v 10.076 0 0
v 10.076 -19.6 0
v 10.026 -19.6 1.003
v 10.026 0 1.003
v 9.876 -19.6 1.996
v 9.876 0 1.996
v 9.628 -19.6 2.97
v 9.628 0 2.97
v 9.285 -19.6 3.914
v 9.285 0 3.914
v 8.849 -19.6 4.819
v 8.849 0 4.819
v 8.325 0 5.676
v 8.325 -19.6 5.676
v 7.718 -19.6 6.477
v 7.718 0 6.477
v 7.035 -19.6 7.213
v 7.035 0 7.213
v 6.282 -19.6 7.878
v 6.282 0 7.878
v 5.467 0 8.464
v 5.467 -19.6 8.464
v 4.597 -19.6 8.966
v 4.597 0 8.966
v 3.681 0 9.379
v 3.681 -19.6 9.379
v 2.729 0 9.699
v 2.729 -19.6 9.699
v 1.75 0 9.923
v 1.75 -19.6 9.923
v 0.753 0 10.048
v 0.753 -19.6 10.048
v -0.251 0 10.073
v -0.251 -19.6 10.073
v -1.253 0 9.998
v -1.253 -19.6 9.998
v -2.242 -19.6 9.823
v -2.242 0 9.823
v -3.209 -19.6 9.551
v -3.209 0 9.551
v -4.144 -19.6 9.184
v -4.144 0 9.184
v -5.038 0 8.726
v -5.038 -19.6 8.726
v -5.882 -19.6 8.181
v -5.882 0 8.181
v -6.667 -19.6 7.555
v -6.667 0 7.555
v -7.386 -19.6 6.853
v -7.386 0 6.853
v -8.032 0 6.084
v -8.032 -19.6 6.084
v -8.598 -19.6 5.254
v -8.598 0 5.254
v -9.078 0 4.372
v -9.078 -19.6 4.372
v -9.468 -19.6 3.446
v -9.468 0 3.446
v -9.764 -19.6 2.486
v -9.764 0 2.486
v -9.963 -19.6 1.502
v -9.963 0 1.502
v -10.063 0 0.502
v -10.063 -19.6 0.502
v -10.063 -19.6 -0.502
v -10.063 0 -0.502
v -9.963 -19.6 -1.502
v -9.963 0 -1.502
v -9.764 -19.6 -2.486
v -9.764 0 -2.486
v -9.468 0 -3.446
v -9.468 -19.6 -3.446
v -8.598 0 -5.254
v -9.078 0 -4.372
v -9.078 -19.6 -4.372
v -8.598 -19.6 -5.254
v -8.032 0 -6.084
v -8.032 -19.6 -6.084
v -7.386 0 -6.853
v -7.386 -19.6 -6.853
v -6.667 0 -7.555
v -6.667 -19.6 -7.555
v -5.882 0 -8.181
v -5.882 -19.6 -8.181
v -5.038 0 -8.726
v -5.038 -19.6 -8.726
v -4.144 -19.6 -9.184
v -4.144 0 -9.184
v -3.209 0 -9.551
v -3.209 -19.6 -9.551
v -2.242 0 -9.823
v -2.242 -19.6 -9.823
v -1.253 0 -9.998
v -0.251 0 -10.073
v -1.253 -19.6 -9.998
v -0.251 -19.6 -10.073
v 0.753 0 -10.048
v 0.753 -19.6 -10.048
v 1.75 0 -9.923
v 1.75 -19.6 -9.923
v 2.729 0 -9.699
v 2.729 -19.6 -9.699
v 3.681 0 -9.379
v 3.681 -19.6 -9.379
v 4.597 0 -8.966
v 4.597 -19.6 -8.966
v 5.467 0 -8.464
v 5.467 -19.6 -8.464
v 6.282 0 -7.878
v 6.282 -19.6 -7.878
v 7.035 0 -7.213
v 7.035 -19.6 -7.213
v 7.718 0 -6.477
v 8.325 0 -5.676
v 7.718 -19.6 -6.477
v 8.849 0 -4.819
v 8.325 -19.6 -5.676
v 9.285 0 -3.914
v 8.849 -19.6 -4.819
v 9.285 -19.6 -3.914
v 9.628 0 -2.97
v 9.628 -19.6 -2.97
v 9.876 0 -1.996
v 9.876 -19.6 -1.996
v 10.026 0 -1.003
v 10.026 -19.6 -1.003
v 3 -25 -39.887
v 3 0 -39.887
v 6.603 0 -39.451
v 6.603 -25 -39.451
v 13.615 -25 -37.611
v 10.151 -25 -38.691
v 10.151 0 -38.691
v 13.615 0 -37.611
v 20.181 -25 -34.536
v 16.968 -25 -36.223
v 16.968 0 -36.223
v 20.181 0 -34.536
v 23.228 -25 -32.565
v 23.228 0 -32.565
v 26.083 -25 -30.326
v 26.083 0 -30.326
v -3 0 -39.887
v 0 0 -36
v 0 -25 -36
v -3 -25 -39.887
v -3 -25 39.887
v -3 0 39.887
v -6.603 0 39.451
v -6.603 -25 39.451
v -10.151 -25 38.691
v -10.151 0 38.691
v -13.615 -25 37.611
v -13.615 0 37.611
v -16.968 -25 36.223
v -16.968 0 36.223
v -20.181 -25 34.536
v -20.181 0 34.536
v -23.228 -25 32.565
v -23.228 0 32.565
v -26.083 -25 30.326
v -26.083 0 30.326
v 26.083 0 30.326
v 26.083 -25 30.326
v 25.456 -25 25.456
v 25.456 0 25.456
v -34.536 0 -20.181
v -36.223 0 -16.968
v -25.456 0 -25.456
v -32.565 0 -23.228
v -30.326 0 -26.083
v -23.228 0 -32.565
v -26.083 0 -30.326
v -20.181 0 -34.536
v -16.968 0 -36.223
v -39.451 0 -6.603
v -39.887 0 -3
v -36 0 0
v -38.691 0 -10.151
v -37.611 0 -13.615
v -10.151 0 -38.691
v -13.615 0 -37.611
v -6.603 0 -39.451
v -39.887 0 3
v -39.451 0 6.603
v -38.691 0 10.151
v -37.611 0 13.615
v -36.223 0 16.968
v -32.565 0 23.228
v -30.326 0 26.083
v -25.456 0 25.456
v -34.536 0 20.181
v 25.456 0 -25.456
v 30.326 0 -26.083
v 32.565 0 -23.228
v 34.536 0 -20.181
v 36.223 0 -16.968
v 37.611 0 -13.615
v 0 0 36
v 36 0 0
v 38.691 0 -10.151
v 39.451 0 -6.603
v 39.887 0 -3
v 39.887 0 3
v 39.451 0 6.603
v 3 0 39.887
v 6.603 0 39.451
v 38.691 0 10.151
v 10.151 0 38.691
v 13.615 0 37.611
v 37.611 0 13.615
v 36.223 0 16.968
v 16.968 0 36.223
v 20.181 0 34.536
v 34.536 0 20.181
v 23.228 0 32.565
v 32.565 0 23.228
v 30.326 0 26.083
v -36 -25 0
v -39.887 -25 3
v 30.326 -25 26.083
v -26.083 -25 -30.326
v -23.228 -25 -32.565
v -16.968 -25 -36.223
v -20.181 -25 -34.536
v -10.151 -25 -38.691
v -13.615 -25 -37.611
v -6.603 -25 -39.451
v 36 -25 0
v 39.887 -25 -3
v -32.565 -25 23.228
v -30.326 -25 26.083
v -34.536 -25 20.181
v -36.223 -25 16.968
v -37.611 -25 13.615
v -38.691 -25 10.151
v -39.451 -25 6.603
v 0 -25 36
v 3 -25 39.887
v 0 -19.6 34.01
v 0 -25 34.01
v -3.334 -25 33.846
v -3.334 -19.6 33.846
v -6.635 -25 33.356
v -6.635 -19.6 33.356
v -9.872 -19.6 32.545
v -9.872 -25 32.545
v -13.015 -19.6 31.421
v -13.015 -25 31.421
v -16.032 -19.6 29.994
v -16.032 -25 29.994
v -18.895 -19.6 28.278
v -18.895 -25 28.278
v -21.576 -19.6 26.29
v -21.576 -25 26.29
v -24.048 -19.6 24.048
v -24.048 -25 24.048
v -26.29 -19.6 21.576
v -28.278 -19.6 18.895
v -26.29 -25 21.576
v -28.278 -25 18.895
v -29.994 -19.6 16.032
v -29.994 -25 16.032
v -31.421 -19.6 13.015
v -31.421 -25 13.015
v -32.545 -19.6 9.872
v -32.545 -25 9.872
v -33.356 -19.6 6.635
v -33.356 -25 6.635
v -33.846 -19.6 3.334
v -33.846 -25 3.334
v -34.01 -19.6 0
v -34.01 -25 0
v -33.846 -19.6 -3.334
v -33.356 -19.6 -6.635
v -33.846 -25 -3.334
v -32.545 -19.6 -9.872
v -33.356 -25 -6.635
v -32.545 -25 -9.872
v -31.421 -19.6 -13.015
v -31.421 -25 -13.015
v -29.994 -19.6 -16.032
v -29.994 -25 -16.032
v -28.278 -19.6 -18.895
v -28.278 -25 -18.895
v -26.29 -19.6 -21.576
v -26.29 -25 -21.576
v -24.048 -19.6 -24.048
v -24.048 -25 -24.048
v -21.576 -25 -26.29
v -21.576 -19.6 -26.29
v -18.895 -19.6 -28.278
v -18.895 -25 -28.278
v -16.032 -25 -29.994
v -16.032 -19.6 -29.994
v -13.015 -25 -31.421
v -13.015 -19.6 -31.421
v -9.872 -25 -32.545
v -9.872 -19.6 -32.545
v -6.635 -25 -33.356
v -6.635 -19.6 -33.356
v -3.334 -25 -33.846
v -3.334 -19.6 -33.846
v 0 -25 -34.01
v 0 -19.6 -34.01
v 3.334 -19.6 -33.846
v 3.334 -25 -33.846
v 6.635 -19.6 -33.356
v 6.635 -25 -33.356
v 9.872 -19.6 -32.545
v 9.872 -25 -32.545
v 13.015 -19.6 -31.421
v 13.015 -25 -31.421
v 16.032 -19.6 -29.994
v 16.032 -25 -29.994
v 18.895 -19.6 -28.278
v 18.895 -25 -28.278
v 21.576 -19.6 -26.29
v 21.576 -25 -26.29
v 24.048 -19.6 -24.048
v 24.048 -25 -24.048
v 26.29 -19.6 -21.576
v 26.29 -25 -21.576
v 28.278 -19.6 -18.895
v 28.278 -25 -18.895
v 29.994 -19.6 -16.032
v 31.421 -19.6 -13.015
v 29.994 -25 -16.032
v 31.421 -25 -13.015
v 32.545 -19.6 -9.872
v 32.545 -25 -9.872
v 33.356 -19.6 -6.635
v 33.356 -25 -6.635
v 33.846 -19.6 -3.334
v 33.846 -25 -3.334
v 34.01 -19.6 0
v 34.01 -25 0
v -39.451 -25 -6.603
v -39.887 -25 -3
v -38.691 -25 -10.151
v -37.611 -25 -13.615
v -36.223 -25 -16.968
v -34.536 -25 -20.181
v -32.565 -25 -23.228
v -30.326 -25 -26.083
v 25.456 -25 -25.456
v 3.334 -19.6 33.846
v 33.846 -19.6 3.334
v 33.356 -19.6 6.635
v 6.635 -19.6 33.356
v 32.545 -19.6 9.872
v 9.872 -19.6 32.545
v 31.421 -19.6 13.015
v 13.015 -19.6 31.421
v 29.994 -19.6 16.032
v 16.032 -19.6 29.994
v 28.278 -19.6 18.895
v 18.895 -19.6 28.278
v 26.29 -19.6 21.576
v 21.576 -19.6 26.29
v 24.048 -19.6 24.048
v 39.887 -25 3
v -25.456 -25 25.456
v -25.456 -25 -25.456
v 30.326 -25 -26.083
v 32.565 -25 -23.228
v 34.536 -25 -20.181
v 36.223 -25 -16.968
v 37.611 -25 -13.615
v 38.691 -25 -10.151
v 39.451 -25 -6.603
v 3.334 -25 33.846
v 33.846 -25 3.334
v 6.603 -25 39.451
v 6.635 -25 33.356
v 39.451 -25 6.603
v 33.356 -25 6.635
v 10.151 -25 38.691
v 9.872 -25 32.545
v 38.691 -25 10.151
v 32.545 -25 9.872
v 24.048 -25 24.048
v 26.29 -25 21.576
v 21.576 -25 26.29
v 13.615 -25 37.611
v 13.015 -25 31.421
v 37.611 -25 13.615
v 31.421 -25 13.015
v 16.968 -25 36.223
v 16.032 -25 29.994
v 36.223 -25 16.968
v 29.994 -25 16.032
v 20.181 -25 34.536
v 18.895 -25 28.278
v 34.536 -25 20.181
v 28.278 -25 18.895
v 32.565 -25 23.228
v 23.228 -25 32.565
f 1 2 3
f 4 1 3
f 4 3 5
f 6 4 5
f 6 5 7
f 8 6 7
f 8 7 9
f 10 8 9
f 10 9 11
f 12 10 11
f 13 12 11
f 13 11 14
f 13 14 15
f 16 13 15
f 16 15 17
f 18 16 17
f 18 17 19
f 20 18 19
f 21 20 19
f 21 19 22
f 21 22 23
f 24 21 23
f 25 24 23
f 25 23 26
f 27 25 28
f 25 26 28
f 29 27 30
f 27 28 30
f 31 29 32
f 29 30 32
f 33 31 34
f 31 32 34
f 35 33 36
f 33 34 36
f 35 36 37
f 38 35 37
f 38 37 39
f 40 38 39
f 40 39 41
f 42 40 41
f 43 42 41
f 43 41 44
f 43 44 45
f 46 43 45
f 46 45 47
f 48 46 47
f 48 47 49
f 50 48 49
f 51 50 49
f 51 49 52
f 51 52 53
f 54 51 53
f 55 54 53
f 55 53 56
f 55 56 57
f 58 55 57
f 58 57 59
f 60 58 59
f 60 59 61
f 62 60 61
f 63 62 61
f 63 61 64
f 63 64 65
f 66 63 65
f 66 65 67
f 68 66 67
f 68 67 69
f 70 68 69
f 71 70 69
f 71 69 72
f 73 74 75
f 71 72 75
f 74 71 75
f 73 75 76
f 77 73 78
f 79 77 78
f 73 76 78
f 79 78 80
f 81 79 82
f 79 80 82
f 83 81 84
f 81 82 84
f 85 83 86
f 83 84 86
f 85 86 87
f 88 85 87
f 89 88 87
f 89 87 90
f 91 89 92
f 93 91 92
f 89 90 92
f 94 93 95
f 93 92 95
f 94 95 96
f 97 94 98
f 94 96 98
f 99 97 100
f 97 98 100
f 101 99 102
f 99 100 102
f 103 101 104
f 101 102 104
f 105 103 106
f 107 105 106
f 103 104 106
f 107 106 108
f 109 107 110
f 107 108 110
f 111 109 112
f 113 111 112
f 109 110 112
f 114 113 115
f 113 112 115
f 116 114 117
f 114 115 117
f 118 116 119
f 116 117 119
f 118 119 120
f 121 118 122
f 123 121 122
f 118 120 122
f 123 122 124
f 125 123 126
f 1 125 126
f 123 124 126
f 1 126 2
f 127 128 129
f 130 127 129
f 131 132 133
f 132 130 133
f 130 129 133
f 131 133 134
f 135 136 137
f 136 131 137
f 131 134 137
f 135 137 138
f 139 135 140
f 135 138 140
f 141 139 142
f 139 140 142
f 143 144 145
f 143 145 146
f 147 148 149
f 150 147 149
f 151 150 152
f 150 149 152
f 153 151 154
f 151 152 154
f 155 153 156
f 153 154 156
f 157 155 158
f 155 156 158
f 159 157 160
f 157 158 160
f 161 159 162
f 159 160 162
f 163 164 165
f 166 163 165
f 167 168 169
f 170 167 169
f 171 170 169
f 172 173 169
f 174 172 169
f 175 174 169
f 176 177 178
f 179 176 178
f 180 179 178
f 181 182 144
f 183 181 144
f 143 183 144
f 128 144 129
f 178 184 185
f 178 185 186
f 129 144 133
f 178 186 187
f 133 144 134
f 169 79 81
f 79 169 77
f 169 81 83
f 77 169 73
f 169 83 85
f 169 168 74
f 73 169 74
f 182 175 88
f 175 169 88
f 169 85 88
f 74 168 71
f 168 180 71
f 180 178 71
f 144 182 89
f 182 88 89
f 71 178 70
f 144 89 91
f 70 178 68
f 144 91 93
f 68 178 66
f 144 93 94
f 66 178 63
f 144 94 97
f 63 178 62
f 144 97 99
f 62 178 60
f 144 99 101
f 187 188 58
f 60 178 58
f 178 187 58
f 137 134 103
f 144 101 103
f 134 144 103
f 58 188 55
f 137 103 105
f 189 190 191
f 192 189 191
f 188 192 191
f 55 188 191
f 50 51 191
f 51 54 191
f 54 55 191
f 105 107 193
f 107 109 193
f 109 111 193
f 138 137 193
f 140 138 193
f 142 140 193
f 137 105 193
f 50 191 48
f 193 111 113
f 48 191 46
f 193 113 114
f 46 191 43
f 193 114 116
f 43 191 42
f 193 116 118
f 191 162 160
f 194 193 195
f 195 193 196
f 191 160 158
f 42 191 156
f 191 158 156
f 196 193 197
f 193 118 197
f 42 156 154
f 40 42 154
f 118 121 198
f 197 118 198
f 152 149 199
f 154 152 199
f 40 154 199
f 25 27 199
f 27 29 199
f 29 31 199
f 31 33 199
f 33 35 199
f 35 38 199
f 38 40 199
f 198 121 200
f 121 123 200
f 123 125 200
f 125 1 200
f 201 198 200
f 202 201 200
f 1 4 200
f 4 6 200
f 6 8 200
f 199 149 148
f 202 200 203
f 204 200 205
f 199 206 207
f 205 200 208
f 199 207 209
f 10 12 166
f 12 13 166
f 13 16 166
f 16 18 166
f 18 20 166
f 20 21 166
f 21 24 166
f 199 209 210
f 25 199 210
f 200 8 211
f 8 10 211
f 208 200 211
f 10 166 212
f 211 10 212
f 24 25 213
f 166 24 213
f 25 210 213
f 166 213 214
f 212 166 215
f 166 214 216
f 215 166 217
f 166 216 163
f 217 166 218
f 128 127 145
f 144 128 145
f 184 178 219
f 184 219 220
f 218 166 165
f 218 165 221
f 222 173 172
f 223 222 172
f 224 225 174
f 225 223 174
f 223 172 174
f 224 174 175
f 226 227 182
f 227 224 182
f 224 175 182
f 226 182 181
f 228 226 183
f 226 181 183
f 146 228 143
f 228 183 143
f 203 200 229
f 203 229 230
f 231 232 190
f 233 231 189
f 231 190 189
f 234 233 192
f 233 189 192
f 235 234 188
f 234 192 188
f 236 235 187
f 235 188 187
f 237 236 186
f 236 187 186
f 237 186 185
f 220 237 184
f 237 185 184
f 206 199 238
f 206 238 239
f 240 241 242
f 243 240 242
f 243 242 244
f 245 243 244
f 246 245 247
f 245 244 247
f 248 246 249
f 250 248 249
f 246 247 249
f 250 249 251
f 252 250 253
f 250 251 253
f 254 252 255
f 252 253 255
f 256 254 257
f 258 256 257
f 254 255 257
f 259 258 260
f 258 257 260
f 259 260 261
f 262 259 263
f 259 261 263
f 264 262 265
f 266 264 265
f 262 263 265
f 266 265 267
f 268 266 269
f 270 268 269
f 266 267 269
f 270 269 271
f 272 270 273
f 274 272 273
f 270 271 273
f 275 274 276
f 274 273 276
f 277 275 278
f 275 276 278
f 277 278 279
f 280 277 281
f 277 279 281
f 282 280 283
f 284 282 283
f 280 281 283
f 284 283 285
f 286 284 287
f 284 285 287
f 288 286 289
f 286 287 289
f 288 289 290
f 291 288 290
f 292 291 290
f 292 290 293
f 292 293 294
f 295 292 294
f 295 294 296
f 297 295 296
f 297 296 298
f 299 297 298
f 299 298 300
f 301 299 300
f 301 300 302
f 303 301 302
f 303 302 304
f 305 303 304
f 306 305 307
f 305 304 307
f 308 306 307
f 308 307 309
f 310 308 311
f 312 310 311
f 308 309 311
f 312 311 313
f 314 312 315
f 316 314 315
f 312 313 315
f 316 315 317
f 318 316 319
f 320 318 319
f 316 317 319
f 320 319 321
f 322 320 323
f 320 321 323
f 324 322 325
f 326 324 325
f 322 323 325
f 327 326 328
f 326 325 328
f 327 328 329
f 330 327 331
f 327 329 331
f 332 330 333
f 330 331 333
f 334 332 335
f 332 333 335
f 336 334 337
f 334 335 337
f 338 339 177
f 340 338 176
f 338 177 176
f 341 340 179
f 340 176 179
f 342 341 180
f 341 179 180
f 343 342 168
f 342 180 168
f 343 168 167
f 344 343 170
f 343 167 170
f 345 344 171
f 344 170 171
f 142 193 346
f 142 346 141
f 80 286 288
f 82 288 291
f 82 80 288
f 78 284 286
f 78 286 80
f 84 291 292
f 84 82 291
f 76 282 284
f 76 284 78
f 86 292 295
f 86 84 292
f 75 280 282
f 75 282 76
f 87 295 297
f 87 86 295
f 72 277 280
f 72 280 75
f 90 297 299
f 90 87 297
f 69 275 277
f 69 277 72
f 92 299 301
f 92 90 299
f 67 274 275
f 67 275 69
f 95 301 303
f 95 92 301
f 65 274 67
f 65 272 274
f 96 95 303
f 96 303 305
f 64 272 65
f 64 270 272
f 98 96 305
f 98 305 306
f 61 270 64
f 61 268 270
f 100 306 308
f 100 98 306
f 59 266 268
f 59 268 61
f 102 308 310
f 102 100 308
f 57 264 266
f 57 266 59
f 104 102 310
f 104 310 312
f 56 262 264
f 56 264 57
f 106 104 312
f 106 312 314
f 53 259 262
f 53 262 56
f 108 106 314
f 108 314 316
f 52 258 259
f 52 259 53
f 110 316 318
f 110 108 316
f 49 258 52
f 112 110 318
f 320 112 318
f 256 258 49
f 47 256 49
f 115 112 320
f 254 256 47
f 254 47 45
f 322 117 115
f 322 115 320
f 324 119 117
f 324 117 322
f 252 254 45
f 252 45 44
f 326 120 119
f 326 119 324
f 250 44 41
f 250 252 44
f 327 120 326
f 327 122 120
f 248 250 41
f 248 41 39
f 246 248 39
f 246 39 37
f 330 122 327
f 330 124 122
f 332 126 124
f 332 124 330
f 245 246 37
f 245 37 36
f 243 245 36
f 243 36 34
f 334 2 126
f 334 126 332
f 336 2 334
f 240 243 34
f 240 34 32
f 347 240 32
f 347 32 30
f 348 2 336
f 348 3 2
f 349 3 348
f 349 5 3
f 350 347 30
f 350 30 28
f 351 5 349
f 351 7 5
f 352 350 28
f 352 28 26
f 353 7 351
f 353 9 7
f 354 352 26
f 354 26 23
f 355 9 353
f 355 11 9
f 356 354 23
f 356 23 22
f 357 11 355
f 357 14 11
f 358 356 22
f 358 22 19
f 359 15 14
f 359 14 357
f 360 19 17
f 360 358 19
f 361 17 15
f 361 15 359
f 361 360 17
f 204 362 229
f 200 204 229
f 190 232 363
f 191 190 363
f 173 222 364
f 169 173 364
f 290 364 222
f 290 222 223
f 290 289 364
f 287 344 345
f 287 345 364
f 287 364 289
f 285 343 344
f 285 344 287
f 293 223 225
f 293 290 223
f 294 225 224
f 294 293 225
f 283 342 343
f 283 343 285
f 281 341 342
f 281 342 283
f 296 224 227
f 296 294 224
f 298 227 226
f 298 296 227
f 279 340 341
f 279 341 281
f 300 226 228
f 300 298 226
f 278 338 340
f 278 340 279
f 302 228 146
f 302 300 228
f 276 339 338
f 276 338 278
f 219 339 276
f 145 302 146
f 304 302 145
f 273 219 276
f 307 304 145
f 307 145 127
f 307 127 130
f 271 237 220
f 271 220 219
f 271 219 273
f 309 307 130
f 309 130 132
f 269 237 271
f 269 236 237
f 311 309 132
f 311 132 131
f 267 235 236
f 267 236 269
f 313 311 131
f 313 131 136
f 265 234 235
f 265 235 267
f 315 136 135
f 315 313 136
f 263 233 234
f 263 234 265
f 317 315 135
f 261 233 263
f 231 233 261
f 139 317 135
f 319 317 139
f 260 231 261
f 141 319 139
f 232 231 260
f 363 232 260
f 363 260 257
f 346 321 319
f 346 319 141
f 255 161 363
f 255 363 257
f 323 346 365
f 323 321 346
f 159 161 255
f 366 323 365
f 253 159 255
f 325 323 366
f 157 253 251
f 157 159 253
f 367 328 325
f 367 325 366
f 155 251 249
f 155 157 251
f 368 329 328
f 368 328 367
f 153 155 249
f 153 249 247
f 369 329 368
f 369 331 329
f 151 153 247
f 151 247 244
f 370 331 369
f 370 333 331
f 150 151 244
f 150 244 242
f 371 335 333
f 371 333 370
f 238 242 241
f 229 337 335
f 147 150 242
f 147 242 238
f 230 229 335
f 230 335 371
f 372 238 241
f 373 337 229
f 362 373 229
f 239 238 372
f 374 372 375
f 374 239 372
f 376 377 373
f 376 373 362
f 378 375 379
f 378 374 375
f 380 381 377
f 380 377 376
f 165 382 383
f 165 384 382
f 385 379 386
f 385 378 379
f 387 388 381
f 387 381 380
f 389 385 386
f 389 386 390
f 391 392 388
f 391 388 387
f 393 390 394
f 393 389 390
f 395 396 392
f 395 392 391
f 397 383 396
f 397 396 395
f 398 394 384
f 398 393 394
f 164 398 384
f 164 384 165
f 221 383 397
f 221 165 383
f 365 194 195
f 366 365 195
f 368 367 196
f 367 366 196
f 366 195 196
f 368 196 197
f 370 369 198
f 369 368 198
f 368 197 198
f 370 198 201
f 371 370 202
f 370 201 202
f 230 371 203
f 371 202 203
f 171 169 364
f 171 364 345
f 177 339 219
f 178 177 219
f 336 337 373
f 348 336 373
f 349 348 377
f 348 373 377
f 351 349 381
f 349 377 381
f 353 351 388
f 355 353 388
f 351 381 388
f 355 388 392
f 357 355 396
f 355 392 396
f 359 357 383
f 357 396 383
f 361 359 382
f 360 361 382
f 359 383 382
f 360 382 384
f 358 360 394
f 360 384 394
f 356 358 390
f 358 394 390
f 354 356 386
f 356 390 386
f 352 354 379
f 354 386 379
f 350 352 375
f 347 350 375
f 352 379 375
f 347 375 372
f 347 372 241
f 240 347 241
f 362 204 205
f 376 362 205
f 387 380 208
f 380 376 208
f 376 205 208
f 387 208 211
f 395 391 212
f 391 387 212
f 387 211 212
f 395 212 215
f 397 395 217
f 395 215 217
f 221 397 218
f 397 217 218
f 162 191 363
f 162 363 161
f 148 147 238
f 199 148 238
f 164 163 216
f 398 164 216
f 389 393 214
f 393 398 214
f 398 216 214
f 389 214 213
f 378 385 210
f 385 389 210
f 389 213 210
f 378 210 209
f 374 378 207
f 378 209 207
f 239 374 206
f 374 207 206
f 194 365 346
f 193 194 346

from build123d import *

# Parameters (mm, degrees)
F0_R            = 40
F1_DEPTH        = 25
F3_DEPTH        = 25
F3_COPIES_COUNT = 8
F4_R            = 10.0757297648
F5_DEPTH        = 25
F7_DEPTH        = 5.4


# Not quite as in the source:
# - a pattern or mirror of a feature is missing from the dataset's text; its kind, count and spacing are read off the source's solid


with BuildPart() as f1:
    # F0 (on Front) → F1 (new body)
    with BuildSketch(Plane.XZ):
        Circle(F0_R)
    extrude(amount=F1_DEPTH)

    # F2 (on face) → F3 (cut)
    with BuildSketch(Plane.XZ.offset(25)):
        with BuildLine():
            ThreePointArc((0, 40), (-1.5010572917, 39.971825415), (-3, 39.8873413504))
            Line((-3, 39.8873413504), (0, 36))
            Line((0, 36), (0, 40))
        make_face()
        with BuildLine():
            Line((0, 36), (3, 39.8873413504))
            ThreePointArc((3, 39.8873413504), (1.5010572917, 39.971825415), (0, 40))
            Line((0, 40), (0, 36))
        make_face()
    f3 = extrude(amount=-F3_DEPTH, mode=Mode.SUBTRACT)

    # F3_copies: F3 ×8 about axis
    f3_copies_axis = Axis((0, 0, 0), (0, 1, 0))
    for i in range(1, F3_COPIES_COUNT):
        add(f3.rotate(f3_copies_axis, i * 360 / F3_COPIES_COUNT), mode=Mode.SUBTRACT)

    # F4 (on face) → F5 (cut)
    with BuildSketch(Plane.XZ.offset(25)):
        Circle(F4_R)
    extrude(amount=-F5_DEPTH, mode=Mode.SUBTRACT)

    # F6 (on face) → F7 (cut)
    with BuildSketch(Plane.XZ.offset(25)):
        with BuildLine():
            ThreePointArc((0, 34.0096793756), (-24.0484749125, -24.0484749125), (34.0096793756, 0))
            ThreePointArc((34.0096793756, 0), (24.0484749125, 24.0484749125), (0, 34.0096793756))
        make_face()
    extrude(amount=-F7_DEPTH, mode=Mode.SUBTRACT)


solid = f1.part
